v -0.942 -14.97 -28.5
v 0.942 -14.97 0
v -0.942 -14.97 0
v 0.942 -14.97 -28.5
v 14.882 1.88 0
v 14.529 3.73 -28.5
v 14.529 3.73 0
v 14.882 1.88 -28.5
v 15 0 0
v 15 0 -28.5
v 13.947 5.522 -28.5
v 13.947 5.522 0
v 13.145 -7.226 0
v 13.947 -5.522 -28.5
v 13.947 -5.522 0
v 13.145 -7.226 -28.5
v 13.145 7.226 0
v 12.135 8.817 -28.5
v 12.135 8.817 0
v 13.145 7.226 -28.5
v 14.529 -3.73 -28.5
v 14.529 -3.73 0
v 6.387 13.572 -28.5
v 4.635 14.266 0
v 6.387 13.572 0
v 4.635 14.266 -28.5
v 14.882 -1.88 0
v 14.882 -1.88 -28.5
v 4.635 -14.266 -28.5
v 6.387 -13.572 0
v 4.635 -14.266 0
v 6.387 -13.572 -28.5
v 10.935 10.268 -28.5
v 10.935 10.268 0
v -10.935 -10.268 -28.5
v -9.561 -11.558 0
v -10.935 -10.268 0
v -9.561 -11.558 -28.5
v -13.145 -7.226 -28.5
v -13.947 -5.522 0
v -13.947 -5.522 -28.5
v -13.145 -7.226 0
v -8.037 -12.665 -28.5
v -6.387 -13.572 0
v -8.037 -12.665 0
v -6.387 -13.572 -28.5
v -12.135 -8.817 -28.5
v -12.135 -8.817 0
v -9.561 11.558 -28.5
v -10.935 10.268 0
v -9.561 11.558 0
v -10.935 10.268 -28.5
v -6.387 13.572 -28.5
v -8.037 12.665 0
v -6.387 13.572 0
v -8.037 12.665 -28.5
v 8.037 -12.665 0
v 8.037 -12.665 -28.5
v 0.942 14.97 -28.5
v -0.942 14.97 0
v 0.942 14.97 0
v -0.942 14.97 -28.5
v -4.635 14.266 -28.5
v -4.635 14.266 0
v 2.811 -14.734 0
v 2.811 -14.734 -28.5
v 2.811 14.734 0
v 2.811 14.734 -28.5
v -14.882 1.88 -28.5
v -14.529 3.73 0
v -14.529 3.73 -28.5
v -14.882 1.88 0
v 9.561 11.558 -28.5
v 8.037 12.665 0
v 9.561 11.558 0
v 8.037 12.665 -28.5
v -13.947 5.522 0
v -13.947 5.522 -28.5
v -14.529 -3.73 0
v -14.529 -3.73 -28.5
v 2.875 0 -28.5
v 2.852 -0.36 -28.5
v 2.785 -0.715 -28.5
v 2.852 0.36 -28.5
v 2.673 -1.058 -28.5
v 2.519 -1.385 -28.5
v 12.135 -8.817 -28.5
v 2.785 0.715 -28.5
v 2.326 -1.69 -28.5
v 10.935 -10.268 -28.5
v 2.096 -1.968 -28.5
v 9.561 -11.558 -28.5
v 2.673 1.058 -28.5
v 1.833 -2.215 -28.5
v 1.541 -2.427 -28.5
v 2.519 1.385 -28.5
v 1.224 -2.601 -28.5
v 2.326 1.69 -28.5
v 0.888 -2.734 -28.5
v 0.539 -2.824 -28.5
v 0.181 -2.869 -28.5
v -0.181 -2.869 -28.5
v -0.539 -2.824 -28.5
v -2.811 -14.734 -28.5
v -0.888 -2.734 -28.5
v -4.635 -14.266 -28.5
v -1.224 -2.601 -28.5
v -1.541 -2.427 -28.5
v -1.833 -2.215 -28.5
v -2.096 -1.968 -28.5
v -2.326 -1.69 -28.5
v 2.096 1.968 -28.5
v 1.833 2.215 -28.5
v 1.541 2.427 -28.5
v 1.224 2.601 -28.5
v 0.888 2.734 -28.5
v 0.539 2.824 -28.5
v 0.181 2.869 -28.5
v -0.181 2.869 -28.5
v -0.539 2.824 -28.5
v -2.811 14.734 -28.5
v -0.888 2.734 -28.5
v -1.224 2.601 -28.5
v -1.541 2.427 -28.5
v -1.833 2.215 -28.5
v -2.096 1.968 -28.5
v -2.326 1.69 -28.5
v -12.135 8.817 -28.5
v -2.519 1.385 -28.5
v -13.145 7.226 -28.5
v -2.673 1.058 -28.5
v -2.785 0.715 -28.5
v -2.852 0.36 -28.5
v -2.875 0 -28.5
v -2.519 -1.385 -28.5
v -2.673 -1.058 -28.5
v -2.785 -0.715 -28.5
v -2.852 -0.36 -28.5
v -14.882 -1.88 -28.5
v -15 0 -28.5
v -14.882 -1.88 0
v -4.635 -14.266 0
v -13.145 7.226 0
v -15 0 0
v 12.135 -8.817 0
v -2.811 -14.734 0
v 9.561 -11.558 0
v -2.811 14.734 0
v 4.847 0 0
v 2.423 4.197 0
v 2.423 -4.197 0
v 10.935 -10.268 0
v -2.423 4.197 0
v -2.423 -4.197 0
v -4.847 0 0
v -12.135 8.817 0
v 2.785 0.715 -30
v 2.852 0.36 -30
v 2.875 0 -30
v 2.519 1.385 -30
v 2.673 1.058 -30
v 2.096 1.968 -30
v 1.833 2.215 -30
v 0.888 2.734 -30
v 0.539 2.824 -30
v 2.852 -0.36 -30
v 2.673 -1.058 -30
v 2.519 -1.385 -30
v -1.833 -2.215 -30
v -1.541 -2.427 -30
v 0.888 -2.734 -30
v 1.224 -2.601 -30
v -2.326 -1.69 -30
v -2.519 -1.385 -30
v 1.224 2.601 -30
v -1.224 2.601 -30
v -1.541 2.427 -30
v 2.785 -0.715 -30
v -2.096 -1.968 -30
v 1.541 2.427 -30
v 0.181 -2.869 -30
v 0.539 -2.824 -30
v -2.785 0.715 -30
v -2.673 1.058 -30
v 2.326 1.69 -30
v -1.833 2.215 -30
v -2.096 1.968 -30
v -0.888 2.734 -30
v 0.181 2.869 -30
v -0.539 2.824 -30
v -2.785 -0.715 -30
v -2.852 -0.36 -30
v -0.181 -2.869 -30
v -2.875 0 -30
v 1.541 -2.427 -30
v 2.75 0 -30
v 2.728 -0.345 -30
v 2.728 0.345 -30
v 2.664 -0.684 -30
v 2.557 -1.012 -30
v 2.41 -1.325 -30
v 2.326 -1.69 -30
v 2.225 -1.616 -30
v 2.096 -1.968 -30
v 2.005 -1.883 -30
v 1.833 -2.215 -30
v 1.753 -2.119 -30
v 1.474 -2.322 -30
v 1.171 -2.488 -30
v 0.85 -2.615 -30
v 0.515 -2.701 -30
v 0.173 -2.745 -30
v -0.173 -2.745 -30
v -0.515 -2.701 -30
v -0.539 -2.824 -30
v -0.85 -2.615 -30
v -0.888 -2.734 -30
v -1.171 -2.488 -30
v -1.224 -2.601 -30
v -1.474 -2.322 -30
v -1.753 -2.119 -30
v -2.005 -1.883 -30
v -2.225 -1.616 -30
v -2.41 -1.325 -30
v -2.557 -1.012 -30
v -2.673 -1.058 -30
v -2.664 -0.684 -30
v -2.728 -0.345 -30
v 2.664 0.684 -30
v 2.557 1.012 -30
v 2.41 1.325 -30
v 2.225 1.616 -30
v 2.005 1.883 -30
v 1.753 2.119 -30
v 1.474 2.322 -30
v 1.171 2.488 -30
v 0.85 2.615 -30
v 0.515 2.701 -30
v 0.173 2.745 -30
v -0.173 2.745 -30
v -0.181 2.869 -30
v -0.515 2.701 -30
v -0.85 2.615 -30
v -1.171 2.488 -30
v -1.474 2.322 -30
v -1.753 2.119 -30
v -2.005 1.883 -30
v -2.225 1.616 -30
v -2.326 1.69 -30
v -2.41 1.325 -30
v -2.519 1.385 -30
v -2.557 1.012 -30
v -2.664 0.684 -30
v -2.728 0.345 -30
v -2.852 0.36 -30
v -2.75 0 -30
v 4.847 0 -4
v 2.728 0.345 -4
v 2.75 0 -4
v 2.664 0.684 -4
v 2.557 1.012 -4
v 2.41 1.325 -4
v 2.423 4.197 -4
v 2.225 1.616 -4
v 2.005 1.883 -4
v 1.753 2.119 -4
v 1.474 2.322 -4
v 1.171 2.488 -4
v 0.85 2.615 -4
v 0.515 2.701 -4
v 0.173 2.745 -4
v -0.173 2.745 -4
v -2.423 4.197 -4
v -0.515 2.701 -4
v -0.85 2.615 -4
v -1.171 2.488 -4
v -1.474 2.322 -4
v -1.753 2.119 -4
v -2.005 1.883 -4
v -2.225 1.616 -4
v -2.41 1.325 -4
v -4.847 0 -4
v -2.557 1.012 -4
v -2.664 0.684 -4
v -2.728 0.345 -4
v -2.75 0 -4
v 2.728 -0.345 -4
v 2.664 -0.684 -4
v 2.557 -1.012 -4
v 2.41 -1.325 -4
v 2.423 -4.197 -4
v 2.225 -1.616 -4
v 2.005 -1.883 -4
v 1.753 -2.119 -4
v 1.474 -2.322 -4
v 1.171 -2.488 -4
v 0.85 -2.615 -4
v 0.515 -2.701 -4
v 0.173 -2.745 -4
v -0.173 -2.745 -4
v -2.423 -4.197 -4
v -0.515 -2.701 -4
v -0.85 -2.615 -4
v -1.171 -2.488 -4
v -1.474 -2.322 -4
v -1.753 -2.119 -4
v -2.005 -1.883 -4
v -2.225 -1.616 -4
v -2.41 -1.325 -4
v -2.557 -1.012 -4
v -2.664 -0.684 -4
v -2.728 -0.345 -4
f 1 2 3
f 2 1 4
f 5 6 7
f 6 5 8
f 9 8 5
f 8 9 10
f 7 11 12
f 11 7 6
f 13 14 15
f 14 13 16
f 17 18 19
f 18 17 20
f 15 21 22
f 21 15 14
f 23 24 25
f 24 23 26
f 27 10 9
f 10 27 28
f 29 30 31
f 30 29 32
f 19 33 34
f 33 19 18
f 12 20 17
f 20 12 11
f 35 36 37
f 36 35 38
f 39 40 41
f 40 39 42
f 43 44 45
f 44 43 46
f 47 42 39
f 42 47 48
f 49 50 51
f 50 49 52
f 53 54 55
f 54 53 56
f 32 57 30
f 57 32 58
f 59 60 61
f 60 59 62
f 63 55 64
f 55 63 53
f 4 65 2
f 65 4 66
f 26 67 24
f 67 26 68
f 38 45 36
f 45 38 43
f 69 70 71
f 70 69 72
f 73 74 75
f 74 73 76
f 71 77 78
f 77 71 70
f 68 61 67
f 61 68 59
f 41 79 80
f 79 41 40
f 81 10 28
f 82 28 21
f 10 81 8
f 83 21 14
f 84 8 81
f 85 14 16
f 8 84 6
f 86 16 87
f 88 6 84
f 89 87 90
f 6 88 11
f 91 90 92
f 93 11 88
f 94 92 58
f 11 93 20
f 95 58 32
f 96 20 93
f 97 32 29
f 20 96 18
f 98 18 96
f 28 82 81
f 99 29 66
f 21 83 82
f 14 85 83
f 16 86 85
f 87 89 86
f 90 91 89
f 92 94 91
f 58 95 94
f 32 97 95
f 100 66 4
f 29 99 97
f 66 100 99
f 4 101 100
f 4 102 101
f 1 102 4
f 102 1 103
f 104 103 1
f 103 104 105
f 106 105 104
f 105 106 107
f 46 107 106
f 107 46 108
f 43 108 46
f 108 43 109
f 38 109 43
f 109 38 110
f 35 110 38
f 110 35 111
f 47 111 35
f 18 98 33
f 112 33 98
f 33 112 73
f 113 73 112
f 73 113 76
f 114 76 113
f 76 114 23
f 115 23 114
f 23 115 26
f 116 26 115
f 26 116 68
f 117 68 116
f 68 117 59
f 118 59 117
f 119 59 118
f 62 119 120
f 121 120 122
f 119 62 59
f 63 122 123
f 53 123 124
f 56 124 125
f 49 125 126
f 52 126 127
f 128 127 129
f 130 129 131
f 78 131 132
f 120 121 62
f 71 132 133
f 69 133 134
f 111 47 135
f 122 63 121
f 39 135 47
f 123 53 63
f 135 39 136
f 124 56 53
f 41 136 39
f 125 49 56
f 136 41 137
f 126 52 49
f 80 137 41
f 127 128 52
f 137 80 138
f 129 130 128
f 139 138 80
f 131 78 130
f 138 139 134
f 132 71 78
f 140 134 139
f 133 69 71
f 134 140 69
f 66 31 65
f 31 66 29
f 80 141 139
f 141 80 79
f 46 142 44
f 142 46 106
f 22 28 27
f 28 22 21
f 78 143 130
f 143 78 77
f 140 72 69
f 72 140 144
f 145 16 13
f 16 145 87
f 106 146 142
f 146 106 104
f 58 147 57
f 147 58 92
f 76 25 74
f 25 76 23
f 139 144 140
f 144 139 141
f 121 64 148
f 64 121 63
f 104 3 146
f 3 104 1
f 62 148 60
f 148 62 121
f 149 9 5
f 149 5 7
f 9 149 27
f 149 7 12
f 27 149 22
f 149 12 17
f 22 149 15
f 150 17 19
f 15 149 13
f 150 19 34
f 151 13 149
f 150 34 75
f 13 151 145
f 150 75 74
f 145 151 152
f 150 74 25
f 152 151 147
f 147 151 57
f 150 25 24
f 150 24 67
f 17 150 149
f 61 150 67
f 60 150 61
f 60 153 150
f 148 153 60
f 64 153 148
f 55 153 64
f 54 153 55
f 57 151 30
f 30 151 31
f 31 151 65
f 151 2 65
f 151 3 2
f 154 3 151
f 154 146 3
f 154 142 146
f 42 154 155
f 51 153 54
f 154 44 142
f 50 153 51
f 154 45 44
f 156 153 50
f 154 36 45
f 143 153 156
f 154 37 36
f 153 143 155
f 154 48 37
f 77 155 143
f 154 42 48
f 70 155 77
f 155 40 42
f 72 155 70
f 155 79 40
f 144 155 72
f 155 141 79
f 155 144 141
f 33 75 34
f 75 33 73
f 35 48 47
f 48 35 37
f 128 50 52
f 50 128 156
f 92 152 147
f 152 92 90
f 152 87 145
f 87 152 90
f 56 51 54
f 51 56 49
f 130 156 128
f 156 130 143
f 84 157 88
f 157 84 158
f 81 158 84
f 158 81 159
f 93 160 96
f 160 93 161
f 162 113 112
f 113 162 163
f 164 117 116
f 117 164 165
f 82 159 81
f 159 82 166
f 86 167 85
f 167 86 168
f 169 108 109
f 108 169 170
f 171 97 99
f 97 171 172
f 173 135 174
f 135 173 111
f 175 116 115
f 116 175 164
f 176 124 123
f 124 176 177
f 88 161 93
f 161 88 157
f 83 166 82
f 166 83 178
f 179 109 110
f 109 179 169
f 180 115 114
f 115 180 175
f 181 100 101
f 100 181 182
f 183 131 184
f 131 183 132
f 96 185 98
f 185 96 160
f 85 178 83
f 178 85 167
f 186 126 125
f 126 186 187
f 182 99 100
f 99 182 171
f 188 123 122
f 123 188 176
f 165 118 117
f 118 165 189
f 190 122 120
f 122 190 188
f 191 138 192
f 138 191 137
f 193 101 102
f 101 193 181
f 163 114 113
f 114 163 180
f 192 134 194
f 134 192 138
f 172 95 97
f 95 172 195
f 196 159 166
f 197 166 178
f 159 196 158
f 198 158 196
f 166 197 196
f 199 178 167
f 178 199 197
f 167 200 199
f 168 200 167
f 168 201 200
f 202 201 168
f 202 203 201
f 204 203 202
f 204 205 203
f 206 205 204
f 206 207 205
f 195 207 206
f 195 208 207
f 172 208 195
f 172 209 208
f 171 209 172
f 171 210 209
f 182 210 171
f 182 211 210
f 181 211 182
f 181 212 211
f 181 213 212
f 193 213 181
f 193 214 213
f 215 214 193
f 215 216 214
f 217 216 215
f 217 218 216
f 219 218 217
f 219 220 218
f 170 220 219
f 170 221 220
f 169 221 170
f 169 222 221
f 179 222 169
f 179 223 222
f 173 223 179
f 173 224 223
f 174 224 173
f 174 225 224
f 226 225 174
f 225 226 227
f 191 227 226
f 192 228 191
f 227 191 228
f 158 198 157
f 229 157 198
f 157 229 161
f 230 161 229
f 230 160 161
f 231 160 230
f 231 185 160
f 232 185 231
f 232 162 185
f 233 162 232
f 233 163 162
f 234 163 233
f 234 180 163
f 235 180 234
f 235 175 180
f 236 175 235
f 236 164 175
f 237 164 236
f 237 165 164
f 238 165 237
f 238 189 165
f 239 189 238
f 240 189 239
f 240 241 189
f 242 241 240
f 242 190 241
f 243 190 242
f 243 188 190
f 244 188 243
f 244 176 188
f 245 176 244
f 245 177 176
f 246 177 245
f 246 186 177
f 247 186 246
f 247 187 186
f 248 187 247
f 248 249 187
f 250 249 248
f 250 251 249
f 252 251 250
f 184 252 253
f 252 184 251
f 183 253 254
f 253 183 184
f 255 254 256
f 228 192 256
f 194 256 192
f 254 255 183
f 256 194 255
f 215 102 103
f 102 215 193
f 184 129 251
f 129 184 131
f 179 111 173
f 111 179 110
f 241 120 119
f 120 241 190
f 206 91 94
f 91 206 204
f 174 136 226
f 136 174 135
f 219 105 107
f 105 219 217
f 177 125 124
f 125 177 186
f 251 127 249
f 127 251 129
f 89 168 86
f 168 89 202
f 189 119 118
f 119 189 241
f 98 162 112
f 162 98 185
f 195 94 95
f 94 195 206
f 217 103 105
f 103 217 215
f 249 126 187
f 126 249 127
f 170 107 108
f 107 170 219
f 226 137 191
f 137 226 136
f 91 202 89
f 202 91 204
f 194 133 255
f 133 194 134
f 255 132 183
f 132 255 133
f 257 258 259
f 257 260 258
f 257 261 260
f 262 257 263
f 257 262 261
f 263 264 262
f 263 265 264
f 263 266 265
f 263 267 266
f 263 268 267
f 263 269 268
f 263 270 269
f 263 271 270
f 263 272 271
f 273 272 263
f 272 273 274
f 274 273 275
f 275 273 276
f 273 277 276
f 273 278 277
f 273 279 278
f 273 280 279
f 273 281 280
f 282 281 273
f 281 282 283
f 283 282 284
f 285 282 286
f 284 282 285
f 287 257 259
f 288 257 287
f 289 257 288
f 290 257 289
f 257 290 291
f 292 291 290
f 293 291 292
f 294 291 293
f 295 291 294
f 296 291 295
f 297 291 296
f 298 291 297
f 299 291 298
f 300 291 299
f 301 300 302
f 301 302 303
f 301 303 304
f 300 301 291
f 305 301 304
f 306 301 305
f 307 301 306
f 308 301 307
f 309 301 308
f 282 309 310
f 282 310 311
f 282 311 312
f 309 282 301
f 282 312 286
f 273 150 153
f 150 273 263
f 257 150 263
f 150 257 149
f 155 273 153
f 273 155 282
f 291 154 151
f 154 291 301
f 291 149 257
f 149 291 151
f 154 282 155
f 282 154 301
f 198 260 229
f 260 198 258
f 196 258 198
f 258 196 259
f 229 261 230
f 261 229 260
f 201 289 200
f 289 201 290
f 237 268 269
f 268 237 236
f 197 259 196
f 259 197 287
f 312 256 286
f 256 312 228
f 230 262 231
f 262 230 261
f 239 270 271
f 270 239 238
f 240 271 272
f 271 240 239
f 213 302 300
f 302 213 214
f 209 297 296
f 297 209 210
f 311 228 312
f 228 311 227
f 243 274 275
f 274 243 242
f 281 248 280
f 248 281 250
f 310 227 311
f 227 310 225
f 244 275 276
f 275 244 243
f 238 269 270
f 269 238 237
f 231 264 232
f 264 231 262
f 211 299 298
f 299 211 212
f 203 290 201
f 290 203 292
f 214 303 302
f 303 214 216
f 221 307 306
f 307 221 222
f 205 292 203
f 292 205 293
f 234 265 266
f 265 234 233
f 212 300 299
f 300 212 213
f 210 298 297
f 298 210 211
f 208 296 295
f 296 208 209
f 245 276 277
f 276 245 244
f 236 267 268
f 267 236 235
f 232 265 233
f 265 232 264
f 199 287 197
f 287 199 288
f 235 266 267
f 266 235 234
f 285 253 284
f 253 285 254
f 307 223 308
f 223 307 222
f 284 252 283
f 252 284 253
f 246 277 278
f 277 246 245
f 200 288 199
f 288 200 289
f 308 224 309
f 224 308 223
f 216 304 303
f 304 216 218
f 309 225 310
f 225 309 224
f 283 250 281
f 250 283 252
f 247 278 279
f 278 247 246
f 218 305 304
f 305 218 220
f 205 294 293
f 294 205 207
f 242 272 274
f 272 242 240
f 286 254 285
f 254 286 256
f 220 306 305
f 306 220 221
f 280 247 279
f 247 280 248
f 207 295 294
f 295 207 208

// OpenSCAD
$fn = 50;

difference() {
	union() {
		translate(v = [0, 0, -28.5]) {
			cylinder(h = 28.5, r = 15.0);
		}
		#translate(v = [0, 0, -30.0]) {
			cylinder(h = 30, r = 2.875);
		}
	}
	union() {
		translate(v = [0, 0, 0]) {
			rotate(a = [0, 0, 0]) {
				difference() {
					union() {
						translate(v = [0, 0, -4]) {
							linear_extrude(height = 4) {
								polygon(points = [[4.8468, 0.0], [2.4234000000000004, 4.197451927062417], [-2.423399999999999, 4.197451927062417], [-4.8468, 5.935618106107392e-16], [-2.423400000000002, -4.197451927062416], [2.423399999999997, -4.197451927062419]]);
							}
						}
					}
					union();
				}
			}
		}
		#translate(v = [0, 0, -100.0]) {
			cylinder(h = 200, r = 2.75);
		}
	}
}
